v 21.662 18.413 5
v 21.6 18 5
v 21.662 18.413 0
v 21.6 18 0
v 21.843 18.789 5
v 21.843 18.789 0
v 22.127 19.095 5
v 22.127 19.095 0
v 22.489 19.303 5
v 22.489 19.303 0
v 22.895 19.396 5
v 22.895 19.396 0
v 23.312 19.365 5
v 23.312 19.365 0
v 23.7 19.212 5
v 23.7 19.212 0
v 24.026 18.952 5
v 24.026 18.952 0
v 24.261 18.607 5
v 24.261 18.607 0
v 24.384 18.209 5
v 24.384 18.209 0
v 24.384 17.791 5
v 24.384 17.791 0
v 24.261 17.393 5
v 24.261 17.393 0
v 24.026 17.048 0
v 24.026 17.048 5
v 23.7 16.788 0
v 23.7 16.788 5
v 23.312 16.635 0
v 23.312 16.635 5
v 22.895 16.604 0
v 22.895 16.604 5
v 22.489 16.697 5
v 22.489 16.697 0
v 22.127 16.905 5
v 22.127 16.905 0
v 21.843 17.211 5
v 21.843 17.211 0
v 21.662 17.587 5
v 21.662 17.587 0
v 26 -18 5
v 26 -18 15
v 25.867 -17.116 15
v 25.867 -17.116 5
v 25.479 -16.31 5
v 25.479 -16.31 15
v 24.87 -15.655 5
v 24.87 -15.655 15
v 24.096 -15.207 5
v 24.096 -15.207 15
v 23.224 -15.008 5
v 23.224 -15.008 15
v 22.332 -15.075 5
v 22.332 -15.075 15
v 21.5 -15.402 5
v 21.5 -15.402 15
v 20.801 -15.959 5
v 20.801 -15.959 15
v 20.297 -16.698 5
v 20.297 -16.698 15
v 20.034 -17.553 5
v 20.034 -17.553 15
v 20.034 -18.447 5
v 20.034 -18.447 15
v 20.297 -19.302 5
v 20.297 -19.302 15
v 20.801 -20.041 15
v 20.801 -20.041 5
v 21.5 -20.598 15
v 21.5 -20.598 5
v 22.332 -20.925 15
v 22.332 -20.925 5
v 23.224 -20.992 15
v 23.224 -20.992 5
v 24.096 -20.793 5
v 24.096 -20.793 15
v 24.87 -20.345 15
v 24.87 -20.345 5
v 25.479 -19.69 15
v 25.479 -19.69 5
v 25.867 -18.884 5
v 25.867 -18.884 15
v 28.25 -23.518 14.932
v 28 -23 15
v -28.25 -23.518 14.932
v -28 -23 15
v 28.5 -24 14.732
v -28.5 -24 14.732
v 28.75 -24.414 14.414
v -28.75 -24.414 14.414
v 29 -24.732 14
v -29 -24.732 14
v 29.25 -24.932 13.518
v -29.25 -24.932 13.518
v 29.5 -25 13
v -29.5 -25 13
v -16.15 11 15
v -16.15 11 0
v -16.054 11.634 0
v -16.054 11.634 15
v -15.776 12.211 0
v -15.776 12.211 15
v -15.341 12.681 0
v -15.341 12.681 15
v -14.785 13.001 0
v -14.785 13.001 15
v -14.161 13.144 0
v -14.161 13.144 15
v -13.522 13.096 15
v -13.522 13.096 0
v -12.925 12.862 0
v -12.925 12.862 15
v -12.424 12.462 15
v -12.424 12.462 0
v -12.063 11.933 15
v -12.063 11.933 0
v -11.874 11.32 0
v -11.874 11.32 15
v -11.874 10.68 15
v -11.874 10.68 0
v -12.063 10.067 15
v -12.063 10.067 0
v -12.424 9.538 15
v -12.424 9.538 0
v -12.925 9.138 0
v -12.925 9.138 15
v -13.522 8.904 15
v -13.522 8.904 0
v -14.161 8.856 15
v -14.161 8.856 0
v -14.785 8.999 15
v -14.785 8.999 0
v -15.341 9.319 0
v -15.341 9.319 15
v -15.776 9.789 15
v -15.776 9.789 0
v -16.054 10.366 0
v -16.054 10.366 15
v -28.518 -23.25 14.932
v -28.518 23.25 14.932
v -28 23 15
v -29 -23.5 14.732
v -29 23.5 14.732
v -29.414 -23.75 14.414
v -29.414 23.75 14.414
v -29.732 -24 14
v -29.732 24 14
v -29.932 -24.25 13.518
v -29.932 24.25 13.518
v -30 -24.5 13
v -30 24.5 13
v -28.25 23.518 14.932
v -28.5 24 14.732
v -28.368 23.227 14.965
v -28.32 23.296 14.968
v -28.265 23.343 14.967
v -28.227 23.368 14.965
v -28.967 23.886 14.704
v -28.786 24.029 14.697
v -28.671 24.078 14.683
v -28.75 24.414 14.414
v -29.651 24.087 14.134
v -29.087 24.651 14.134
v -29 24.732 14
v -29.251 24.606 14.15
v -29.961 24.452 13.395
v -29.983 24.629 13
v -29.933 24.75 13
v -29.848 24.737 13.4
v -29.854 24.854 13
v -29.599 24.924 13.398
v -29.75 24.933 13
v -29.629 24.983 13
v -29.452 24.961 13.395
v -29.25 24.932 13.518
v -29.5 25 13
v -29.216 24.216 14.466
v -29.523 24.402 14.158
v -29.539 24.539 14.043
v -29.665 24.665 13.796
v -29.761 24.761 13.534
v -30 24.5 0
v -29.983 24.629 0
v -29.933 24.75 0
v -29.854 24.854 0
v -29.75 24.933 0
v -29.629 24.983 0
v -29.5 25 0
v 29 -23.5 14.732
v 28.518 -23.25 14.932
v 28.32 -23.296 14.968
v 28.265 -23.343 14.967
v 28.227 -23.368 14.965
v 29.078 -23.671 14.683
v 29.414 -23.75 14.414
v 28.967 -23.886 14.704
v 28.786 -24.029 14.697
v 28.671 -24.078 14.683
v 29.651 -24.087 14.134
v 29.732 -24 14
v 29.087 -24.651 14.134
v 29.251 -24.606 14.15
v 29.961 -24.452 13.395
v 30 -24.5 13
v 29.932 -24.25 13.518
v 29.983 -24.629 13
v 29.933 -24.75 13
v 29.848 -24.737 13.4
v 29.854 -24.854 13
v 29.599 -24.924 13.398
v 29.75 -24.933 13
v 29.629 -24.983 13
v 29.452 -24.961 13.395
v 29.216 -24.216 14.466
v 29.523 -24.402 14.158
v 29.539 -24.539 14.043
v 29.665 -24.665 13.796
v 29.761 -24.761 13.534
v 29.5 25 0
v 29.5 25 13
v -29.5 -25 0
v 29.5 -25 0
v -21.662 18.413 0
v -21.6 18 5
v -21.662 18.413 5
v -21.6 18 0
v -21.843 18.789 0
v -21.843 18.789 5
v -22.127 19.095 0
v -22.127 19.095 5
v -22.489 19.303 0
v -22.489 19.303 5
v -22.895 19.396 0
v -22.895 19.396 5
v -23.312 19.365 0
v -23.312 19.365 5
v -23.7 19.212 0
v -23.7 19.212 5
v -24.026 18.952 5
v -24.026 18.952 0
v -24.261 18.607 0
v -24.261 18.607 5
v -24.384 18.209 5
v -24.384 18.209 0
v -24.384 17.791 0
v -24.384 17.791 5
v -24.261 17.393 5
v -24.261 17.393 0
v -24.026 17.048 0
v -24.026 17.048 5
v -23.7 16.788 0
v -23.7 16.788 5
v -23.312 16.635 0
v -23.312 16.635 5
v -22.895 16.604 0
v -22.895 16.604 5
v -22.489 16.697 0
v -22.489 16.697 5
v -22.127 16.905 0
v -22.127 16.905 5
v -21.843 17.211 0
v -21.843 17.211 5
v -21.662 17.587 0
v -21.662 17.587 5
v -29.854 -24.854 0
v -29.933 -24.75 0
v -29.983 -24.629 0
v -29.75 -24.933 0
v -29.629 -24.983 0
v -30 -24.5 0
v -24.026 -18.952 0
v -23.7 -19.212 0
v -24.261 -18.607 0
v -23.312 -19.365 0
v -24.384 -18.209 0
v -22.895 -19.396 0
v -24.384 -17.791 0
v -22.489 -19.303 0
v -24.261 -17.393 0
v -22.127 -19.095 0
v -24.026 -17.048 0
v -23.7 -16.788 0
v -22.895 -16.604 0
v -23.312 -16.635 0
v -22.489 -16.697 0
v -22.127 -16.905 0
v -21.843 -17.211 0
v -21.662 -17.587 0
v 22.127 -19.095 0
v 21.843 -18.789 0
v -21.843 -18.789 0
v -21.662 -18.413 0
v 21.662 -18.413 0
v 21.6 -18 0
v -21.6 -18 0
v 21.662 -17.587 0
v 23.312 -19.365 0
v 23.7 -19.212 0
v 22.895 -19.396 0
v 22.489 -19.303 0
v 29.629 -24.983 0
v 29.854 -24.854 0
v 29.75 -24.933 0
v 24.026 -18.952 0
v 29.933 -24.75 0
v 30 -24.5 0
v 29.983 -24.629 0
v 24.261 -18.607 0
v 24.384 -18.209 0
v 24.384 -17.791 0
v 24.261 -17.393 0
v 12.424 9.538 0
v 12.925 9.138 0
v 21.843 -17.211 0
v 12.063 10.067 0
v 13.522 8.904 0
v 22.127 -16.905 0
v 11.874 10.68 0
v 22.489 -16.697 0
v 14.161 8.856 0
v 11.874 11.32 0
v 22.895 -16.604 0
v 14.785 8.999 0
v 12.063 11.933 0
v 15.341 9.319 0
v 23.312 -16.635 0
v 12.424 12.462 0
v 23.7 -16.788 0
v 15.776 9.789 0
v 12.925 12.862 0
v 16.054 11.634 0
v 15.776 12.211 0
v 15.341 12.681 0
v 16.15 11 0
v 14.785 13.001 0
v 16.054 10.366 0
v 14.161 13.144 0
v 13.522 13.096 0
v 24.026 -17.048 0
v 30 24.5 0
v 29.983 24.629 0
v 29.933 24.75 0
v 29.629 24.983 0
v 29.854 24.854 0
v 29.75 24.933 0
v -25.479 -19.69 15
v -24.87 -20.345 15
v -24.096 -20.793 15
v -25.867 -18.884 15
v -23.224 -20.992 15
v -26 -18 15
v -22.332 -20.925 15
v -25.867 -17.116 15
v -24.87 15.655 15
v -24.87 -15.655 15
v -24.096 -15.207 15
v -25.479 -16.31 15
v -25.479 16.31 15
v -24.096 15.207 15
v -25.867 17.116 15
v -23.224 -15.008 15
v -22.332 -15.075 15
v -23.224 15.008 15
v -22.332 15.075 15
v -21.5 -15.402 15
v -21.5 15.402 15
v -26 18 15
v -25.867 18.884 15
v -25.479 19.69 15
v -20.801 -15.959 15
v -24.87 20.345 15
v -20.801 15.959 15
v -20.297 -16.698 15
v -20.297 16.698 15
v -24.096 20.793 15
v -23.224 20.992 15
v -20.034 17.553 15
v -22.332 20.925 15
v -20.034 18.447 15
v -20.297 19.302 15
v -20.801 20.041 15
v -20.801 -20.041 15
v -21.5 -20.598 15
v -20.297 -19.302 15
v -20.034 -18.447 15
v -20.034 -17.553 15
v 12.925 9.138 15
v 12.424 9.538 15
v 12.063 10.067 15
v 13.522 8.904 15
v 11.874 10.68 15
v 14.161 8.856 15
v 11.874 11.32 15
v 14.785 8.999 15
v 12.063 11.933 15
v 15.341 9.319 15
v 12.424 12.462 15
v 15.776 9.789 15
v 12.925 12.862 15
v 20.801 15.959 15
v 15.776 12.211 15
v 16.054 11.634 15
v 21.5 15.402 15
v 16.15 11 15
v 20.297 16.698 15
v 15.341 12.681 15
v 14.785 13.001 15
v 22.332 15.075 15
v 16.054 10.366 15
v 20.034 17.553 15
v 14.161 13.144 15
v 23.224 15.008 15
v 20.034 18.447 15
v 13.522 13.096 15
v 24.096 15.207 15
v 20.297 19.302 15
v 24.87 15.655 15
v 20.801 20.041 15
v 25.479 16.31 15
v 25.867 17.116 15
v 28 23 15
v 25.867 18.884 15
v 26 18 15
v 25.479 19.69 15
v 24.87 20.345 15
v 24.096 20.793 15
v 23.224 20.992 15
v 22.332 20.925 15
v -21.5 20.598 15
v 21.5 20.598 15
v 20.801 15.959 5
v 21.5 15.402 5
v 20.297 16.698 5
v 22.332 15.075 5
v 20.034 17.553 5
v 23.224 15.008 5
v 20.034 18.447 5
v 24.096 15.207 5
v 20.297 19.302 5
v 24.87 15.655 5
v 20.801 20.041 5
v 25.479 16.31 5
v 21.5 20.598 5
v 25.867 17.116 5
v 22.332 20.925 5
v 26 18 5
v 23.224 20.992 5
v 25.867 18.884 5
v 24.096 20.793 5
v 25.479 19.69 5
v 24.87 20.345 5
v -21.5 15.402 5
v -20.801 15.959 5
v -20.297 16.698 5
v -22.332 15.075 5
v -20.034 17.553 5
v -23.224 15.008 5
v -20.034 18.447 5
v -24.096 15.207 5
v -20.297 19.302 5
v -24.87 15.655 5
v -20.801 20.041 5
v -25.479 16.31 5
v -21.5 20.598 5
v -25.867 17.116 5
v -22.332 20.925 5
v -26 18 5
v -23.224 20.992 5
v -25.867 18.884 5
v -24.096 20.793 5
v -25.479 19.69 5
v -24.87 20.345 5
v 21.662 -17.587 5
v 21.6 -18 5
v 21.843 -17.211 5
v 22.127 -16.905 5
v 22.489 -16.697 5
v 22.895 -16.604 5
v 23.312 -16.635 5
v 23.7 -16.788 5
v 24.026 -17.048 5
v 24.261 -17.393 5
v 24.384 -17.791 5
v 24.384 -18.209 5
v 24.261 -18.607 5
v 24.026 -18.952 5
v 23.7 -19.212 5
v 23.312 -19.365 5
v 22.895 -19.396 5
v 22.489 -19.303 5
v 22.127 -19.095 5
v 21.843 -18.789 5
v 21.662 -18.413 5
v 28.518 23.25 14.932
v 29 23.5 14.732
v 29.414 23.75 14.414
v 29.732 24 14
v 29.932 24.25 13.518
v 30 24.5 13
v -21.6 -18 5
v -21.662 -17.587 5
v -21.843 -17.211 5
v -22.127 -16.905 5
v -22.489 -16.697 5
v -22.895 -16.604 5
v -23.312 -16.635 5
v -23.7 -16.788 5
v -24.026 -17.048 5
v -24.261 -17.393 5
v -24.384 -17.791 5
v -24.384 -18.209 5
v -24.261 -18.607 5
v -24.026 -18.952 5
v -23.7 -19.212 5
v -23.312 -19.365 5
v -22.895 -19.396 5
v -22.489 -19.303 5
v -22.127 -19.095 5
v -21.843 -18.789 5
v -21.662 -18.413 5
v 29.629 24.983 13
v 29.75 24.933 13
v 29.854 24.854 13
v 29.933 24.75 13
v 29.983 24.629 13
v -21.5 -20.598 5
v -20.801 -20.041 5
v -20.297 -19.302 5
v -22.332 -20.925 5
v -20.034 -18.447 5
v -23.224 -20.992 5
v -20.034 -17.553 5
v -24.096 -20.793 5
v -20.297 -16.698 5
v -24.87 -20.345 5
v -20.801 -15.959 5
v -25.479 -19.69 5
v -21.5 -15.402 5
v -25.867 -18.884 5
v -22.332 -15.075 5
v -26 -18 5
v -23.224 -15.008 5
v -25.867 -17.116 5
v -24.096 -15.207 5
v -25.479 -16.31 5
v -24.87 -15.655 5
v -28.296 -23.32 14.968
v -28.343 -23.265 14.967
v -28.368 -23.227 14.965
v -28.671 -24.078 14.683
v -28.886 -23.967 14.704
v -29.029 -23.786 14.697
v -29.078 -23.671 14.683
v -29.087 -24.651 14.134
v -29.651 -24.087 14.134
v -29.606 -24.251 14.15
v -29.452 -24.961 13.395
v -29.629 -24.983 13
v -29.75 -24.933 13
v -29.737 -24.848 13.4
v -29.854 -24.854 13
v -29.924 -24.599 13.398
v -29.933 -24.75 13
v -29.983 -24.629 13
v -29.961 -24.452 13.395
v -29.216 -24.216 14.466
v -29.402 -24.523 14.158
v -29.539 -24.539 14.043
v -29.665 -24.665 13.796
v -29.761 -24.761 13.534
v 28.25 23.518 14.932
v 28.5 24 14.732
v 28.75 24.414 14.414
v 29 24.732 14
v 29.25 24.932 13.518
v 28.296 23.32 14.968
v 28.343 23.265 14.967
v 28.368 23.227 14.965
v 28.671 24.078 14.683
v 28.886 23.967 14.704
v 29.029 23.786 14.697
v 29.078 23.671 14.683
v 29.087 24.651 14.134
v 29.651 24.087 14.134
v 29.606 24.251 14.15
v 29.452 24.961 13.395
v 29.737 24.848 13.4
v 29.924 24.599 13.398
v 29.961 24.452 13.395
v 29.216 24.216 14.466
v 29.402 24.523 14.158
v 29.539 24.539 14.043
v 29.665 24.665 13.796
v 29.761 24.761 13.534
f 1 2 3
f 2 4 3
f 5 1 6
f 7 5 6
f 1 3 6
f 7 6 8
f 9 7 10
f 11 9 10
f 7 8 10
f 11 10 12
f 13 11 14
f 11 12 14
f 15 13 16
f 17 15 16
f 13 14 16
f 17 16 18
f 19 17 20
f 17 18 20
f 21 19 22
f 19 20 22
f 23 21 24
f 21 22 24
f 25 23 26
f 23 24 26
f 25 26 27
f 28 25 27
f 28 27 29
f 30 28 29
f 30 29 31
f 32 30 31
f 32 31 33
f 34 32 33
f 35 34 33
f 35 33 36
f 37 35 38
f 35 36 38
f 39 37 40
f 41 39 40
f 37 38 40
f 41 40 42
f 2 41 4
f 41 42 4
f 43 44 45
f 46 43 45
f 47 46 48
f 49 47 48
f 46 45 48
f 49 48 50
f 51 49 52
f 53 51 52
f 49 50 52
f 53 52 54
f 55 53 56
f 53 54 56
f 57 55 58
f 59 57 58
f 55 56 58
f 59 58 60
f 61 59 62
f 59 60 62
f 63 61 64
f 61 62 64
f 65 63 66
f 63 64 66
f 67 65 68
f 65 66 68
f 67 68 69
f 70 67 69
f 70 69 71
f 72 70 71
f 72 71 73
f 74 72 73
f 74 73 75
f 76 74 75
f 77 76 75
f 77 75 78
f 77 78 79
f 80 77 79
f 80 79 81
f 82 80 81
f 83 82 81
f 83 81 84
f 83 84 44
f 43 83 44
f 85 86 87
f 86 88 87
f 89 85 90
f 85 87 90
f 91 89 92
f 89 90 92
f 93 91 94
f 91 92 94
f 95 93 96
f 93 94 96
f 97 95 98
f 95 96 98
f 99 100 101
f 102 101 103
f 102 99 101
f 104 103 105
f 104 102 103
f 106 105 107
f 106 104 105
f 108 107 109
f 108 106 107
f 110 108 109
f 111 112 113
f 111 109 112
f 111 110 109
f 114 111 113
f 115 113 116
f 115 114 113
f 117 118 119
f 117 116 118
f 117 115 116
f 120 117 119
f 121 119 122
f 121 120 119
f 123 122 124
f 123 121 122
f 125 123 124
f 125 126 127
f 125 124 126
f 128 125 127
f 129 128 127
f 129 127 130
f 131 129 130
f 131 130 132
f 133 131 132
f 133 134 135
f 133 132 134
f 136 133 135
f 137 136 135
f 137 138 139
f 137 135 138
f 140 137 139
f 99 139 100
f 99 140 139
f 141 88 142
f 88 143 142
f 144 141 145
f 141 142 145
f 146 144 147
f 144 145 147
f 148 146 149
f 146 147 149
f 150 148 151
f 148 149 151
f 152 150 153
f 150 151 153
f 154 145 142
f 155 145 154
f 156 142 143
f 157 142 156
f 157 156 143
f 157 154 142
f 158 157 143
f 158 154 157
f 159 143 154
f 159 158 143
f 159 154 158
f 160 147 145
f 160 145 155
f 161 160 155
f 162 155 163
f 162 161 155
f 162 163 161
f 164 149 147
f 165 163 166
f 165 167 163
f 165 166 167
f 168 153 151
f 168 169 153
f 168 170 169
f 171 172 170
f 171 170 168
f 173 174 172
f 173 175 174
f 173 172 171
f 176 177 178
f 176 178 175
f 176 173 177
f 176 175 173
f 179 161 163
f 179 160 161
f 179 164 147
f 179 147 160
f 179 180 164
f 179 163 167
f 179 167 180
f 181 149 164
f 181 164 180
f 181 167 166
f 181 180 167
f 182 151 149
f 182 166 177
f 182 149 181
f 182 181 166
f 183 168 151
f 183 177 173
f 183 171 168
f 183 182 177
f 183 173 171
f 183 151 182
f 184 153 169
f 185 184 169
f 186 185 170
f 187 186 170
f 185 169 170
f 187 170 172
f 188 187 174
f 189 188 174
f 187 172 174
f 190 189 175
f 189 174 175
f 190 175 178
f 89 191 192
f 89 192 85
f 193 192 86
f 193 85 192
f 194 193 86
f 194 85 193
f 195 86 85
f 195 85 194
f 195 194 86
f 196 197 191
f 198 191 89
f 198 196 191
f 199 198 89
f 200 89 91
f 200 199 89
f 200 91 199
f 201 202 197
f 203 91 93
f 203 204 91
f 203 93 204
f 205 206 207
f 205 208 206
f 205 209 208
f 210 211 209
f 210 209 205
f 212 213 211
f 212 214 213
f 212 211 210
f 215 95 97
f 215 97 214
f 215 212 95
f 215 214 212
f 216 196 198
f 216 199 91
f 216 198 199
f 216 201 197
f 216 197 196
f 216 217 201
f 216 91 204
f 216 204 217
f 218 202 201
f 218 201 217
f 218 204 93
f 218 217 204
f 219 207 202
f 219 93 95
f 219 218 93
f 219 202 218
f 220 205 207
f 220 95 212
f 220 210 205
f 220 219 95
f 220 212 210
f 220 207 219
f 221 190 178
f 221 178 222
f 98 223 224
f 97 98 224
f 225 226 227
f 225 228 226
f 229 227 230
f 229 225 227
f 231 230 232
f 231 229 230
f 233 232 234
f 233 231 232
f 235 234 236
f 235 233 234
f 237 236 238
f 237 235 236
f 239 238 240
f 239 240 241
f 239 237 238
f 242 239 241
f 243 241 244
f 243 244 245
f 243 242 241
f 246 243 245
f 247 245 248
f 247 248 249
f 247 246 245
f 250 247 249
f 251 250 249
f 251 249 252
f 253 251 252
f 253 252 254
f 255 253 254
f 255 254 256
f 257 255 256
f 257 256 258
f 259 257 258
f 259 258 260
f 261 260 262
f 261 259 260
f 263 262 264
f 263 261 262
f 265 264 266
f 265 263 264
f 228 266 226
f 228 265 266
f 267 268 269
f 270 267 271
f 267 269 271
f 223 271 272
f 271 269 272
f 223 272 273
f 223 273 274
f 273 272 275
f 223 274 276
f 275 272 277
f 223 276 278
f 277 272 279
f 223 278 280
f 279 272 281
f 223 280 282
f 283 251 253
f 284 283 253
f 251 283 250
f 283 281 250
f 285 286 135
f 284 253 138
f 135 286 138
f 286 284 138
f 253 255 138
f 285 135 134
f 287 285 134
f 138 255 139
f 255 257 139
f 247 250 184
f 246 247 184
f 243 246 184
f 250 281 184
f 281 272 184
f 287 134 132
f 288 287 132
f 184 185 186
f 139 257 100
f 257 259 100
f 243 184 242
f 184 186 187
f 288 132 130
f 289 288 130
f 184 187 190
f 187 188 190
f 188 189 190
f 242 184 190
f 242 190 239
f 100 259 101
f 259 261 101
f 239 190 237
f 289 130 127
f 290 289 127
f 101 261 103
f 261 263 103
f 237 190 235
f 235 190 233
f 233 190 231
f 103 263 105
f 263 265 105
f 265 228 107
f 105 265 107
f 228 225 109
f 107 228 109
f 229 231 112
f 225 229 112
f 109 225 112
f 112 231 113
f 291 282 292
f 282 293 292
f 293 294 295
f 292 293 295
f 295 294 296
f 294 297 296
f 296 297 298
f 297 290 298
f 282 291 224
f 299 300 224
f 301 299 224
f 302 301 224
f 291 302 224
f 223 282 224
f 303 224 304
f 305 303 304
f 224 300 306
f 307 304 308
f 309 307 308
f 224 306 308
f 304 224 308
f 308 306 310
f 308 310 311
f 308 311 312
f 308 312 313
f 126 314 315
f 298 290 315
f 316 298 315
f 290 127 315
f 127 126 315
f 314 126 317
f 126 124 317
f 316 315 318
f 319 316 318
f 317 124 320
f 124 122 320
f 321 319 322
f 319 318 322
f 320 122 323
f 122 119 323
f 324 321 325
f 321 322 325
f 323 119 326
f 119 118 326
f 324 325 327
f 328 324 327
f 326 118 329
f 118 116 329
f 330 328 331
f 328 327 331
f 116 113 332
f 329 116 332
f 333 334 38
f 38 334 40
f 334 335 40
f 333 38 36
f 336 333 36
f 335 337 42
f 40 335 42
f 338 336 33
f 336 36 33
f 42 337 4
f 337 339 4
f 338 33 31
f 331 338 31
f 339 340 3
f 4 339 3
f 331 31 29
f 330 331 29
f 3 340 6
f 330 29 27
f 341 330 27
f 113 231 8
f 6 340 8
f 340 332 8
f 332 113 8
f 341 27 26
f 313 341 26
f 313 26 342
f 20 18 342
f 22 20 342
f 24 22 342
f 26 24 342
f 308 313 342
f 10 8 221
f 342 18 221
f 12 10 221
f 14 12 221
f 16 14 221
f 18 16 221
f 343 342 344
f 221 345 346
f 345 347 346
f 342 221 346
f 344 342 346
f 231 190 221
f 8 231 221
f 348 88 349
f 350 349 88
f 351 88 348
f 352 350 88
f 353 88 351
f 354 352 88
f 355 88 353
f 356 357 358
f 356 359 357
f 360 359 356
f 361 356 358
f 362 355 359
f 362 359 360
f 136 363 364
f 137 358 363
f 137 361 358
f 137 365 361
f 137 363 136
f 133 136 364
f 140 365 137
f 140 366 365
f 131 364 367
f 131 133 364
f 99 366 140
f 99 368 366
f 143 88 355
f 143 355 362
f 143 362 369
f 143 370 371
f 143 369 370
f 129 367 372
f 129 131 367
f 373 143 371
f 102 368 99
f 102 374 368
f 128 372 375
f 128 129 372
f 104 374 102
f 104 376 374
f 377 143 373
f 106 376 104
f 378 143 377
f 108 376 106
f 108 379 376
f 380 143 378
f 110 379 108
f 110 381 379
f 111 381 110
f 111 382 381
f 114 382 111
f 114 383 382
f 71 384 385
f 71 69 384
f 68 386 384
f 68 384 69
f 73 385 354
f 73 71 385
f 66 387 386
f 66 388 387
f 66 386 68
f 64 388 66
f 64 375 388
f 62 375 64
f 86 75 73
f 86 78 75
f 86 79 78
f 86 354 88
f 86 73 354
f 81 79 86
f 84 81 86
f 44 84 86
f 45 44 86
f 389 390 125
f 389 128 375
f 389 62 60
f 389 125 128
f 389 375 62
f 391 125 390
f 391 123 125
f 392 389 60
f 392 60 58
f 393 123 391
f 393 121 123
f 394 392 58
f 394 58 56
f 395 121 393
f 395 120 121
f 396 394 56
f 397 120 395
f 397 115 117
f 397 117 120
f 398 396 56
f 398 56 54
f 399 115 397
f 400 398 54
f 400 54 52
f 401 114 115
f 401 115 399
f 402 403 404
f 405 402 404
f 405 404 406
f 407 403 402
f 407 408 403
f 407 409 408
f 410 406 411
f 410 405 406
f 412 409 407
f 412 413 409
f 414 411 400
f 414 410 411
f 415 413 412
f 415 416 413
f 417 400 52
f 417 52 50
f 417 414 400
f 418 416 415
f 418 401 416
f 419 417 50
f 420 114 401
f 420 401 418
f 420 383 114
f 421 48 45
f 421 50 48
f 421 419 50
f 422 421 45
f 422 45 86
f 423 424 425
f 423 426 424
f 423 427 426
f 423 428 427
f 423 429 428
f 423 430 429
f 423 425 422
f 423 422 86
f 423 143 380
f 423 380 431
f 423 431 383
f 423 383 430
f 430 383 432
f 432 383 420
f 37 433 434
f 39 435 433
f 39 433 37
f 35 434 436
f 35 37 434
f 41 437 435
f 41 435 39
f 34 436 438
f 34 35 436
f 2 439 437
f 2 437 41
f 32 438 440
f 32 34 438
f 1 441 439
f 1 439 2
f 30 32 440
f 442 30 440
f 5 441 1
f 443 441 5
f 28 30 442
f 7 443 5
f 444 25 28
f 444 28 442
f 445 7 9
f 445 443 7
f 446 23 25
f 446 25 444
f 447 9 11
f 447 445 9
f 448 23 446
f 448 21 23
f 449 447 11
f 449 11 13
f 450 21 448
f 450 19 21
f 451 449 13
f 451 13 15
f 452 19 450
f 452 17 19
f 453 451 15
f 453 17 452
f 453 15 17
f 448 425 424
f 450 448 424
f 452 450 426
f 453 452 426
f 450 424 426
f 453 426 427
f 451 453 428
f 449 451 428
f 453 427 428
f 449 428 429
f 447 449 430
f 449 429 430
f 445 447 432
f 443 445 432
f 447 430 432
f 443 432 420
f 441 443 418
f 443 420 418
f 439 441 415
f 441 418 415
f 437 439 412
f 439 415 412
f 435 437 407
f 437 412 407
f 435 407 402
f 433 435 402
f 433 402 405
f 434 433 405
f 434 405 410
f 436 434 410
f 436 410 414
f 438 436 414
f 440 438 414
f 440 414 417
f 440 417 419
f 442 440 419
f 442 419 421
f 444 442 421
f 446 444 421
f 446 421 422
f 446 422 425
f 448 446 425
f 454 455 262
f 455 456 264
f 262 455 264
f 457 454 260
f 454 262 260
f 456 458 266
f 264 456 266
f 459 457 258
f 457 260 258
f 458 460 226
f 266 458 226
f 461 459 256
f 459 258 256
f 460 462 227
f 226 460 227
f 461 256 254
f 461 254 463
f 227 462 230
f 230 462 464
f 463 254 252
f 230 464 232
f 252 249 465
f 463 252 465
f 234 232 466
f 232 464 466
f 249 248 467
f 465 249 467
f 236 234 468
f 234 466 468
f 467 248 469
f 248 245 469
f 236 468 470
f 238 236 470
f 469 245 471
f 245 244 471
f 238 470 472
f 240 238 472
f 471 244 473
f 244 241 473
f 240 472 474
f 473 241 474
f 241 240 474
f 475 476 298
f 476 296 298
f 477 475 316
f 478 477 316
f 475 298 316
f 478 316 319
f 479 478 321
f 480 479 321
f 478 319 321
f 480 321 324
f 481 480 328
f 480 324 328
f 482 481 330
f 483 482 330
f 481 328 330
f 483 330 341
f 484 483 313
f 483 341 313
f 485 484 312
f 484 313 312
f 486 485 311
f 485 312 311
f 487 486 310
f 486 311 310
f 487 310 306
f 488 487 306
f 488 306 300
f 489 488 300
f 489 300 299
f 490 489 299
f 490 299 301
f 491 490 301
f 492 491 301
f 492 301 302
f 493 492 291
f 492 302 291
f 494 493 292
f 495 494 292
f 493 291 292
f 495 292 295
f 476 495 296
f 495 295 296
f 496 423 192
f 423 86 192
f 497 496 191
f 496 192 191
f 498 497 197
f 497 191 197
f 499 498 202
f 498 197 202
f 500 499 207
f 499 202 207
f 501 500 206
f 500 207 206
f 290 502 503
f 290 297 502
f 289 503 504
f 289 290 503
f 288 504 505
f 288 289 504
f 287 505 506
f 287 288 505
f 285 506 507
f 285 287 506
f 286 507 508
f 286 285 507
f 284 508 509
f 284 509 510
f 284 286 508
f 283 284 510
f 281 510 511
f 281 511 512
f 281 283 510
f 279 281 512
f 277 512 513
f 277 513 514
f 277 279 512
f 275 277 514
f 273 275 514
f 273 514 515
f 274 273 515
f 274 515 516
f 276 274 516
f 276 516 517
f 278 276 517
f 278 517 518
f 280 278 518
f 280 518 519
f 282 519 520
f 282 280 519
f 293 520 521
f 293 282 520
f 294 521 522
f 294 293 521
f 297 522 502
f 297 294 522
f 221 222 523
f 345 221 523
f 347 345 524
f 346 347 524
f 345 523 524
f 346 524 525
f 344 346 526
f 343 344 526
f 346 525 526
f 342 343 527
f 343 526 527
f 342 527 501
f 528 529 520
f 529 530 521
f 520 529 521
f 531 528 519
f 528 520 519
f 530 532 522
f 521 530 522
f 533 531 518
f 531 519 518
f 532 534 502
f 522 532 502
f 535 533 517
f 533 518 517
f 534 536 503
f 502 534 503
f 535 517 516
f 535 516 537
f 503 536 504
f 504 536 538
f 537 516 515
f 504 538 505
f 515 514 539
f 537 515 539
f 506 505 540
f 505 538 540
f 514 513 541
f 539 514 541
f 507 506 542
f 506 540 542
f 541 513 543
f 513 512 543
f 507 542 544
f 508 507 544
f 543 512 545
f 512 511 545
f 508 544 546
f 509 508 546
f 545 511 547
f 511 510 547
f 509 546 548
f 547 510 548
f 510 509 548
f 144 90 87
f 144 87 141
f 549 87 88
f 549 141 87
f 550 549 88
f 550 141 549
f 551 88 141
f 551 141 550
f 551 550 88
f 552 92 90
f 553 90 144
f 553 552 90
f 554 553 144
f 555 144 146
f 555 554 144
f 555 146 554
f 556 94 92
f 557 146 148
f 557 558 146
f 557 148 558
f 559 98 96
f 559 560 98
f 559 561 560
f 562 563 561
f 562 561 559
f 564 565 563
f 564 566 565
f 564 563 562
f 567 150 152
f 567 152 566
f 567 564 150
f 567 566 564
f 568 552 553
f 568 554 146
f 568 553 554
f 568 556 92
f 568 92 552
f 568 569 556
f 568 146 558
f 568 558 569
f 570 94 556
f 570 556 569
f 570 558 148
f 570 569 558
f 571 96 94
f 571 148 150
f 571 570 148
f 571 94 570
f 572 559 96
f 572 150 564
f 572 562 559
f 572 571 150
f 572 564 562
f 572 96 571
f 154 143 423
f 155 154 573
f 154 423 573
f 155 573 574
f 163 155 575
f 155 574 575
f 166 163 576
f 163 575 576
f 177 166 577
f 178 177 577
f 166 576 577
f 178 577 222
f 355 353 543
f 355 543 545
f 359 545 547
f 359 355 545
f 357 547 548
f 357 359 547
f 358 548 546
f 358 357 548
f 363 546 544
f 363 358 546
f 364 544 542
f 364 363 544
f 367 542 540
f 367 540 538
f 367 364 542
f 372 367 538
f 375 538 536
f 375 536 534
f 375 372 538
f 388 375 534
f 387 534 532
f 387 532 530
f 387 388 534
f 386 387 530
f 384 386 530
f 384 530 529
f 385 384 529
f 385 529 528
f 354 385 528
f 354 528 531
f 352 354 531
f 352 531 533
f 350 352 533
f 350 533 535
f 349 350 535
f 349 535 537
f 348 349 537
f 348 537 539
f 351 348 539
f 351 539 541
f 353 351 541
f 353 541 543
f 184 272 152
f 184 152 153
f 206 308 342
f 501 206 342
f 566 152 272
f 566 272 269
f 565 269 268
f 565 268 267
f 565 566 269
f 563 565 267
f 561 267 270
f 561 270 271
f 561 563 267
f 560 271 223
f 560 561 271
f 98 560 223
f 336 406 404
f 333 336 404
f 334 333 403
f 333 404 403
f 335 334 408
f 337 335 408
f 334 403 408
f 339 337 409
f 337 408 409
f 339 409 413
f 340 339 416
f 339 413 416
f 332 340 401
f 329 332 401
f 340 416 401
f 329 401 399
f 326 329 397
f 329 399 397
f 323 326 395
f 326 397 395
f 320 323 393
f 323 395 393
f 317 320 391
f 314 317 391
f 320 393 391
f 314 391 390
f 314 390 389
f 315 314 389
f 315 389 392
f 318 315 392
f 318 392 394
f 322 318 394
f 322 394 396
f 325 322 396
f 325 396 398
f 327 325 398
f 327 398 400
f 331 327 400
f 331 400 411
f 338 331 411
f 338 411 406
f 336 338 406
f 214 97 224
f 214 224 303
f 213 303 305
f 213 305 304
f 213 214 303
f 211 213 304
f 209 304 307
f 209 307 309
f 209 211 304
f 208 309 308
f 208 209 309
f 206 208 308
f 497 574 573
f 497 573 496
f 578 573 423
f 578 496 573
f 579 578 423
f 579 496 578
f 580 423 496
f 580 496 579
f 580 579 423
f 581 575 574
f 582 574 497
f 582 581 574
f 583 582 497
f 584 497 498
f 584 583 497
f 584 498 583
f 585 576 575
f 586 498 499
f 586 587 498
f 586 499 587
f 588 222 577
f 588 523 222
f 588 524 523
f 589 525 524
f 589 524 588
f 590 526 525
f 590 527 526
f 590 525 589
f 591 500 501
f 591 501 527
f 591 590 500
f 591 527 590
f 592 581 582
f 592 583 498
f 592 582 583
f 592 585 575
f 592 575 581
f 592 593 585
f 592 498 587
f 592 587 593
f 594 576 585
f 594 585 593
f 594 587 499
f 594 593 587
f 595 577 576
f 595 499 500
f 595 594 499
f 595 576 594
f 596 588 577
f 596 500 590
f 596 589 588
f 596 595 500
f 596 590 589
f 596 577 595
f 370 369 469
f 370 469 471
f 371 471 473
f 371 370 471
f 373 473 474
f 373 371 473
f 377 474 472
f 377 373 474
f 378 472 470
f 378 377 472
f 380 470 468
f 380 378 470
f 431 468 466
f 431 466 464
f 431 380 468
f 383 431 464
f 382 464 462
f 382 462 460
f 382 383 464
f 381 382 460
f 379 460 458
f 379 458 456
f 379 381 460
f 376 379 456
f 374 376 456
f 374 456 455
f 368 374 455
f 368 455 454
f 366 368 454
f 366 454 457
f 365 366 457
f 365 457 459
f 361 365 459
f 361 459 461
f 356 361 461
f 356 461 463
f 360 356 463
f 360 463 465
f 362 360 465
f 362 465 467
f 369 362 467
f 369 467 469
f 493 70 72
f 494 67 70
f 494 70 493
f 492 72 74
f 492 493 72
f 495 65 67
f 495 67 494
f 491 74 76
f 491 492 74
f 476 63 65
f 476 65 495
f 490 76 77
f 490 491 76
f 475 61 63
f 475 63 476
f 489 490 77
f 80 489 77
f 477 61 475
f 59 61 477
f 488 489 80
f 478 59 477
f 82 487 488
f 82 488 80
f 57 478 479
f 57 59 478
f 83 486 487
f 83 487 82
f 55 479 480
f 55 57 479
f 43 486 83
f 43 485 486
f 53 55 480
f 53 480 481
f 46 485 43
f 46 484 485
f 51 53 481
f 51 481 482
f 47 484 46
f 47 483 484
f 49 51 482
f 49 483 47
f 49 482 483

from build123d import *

# Parameters (mm, degrees)
SKETCH015_W         = 60
SKETCH015_H         = 50
PAD005_DEPTH        = 15
HOLE006_D           = 2.8
HOLE006_DEPTH       = 25
HOLE006_CBORE_D     = 6
HOLE006_CBORE_DEPTH = 10
SKETCH018_R         = 2.15
HOLE007_DEPTH       = 25
FILLET008_R         = 0.5
FILLET009_R         = 2


with BuildPart() as part:
    # Sketch015 → Pad005 (new body)
    with BuildSketch(Plane.XY):
        Rectangle(SKETCH015_W, SKETCH015_H)
    extrude(amount=PAD005_DEPTH)

    # Hole006
    with Locations(Plane.XY.offset(15)):
        with Locations((23, 18), (23, -18)):
            hole006 = CounterBoreHole(HOLE006_D / 2, HOLE006_CBORE_D / 2, HOLE006_CBORE_DEPTH, depth=HOLE006_DEPTH)

    # Mirrored009: Hole006 across Sketch016 V_Axis
    add(hole006.mirror(Plane(origin=(0, 0, 15), x_dir=(0, 0, 1), z_dir=(1, 0, 0))), mode=Mode.SUBTRACT)

    # Sketch018 → Hole007 (cut)
    with BuildSketch(Plane.XY.offset(15)):
        with Locations((14, 11)):
            Circle(SKETCH018_R)
    hole007 = extrude(amount=-HOLE007_DEPTH, mode=Mode.SUBTRACT)

    # Mirrored011: Hole007 across Sketch018 V_Axis
    add(hole007.mirror(Plane(origin=(0, 0, 15), x_dir=(0, 0, 1), z_dir=(1, 0, 0))), mode=Mode.SUBTRACT)

    # Fillet008
    fillet008_edges = [part.edges().sort_by_distance(p)[0] for p in [
        (-30, -25, 7.5),
        (30, -25, 7.5),
        (30, 25, 7.5),
        (-30, 25, 7.5),
    ]]
    fillet(fillet008_edges, radius=FILLET008_R)

    # Fillet009
    fillet009_edges = [part.edges().sort_by_distance(p)[0] for p in [
        (0, 25, 15),
        (-30, 0, 15),
        (30, 0, 15),
        (0, -25, 15),
    ]]
    fillet(fillet009_edges, radius=FILLET009_R)


solid = part.part
